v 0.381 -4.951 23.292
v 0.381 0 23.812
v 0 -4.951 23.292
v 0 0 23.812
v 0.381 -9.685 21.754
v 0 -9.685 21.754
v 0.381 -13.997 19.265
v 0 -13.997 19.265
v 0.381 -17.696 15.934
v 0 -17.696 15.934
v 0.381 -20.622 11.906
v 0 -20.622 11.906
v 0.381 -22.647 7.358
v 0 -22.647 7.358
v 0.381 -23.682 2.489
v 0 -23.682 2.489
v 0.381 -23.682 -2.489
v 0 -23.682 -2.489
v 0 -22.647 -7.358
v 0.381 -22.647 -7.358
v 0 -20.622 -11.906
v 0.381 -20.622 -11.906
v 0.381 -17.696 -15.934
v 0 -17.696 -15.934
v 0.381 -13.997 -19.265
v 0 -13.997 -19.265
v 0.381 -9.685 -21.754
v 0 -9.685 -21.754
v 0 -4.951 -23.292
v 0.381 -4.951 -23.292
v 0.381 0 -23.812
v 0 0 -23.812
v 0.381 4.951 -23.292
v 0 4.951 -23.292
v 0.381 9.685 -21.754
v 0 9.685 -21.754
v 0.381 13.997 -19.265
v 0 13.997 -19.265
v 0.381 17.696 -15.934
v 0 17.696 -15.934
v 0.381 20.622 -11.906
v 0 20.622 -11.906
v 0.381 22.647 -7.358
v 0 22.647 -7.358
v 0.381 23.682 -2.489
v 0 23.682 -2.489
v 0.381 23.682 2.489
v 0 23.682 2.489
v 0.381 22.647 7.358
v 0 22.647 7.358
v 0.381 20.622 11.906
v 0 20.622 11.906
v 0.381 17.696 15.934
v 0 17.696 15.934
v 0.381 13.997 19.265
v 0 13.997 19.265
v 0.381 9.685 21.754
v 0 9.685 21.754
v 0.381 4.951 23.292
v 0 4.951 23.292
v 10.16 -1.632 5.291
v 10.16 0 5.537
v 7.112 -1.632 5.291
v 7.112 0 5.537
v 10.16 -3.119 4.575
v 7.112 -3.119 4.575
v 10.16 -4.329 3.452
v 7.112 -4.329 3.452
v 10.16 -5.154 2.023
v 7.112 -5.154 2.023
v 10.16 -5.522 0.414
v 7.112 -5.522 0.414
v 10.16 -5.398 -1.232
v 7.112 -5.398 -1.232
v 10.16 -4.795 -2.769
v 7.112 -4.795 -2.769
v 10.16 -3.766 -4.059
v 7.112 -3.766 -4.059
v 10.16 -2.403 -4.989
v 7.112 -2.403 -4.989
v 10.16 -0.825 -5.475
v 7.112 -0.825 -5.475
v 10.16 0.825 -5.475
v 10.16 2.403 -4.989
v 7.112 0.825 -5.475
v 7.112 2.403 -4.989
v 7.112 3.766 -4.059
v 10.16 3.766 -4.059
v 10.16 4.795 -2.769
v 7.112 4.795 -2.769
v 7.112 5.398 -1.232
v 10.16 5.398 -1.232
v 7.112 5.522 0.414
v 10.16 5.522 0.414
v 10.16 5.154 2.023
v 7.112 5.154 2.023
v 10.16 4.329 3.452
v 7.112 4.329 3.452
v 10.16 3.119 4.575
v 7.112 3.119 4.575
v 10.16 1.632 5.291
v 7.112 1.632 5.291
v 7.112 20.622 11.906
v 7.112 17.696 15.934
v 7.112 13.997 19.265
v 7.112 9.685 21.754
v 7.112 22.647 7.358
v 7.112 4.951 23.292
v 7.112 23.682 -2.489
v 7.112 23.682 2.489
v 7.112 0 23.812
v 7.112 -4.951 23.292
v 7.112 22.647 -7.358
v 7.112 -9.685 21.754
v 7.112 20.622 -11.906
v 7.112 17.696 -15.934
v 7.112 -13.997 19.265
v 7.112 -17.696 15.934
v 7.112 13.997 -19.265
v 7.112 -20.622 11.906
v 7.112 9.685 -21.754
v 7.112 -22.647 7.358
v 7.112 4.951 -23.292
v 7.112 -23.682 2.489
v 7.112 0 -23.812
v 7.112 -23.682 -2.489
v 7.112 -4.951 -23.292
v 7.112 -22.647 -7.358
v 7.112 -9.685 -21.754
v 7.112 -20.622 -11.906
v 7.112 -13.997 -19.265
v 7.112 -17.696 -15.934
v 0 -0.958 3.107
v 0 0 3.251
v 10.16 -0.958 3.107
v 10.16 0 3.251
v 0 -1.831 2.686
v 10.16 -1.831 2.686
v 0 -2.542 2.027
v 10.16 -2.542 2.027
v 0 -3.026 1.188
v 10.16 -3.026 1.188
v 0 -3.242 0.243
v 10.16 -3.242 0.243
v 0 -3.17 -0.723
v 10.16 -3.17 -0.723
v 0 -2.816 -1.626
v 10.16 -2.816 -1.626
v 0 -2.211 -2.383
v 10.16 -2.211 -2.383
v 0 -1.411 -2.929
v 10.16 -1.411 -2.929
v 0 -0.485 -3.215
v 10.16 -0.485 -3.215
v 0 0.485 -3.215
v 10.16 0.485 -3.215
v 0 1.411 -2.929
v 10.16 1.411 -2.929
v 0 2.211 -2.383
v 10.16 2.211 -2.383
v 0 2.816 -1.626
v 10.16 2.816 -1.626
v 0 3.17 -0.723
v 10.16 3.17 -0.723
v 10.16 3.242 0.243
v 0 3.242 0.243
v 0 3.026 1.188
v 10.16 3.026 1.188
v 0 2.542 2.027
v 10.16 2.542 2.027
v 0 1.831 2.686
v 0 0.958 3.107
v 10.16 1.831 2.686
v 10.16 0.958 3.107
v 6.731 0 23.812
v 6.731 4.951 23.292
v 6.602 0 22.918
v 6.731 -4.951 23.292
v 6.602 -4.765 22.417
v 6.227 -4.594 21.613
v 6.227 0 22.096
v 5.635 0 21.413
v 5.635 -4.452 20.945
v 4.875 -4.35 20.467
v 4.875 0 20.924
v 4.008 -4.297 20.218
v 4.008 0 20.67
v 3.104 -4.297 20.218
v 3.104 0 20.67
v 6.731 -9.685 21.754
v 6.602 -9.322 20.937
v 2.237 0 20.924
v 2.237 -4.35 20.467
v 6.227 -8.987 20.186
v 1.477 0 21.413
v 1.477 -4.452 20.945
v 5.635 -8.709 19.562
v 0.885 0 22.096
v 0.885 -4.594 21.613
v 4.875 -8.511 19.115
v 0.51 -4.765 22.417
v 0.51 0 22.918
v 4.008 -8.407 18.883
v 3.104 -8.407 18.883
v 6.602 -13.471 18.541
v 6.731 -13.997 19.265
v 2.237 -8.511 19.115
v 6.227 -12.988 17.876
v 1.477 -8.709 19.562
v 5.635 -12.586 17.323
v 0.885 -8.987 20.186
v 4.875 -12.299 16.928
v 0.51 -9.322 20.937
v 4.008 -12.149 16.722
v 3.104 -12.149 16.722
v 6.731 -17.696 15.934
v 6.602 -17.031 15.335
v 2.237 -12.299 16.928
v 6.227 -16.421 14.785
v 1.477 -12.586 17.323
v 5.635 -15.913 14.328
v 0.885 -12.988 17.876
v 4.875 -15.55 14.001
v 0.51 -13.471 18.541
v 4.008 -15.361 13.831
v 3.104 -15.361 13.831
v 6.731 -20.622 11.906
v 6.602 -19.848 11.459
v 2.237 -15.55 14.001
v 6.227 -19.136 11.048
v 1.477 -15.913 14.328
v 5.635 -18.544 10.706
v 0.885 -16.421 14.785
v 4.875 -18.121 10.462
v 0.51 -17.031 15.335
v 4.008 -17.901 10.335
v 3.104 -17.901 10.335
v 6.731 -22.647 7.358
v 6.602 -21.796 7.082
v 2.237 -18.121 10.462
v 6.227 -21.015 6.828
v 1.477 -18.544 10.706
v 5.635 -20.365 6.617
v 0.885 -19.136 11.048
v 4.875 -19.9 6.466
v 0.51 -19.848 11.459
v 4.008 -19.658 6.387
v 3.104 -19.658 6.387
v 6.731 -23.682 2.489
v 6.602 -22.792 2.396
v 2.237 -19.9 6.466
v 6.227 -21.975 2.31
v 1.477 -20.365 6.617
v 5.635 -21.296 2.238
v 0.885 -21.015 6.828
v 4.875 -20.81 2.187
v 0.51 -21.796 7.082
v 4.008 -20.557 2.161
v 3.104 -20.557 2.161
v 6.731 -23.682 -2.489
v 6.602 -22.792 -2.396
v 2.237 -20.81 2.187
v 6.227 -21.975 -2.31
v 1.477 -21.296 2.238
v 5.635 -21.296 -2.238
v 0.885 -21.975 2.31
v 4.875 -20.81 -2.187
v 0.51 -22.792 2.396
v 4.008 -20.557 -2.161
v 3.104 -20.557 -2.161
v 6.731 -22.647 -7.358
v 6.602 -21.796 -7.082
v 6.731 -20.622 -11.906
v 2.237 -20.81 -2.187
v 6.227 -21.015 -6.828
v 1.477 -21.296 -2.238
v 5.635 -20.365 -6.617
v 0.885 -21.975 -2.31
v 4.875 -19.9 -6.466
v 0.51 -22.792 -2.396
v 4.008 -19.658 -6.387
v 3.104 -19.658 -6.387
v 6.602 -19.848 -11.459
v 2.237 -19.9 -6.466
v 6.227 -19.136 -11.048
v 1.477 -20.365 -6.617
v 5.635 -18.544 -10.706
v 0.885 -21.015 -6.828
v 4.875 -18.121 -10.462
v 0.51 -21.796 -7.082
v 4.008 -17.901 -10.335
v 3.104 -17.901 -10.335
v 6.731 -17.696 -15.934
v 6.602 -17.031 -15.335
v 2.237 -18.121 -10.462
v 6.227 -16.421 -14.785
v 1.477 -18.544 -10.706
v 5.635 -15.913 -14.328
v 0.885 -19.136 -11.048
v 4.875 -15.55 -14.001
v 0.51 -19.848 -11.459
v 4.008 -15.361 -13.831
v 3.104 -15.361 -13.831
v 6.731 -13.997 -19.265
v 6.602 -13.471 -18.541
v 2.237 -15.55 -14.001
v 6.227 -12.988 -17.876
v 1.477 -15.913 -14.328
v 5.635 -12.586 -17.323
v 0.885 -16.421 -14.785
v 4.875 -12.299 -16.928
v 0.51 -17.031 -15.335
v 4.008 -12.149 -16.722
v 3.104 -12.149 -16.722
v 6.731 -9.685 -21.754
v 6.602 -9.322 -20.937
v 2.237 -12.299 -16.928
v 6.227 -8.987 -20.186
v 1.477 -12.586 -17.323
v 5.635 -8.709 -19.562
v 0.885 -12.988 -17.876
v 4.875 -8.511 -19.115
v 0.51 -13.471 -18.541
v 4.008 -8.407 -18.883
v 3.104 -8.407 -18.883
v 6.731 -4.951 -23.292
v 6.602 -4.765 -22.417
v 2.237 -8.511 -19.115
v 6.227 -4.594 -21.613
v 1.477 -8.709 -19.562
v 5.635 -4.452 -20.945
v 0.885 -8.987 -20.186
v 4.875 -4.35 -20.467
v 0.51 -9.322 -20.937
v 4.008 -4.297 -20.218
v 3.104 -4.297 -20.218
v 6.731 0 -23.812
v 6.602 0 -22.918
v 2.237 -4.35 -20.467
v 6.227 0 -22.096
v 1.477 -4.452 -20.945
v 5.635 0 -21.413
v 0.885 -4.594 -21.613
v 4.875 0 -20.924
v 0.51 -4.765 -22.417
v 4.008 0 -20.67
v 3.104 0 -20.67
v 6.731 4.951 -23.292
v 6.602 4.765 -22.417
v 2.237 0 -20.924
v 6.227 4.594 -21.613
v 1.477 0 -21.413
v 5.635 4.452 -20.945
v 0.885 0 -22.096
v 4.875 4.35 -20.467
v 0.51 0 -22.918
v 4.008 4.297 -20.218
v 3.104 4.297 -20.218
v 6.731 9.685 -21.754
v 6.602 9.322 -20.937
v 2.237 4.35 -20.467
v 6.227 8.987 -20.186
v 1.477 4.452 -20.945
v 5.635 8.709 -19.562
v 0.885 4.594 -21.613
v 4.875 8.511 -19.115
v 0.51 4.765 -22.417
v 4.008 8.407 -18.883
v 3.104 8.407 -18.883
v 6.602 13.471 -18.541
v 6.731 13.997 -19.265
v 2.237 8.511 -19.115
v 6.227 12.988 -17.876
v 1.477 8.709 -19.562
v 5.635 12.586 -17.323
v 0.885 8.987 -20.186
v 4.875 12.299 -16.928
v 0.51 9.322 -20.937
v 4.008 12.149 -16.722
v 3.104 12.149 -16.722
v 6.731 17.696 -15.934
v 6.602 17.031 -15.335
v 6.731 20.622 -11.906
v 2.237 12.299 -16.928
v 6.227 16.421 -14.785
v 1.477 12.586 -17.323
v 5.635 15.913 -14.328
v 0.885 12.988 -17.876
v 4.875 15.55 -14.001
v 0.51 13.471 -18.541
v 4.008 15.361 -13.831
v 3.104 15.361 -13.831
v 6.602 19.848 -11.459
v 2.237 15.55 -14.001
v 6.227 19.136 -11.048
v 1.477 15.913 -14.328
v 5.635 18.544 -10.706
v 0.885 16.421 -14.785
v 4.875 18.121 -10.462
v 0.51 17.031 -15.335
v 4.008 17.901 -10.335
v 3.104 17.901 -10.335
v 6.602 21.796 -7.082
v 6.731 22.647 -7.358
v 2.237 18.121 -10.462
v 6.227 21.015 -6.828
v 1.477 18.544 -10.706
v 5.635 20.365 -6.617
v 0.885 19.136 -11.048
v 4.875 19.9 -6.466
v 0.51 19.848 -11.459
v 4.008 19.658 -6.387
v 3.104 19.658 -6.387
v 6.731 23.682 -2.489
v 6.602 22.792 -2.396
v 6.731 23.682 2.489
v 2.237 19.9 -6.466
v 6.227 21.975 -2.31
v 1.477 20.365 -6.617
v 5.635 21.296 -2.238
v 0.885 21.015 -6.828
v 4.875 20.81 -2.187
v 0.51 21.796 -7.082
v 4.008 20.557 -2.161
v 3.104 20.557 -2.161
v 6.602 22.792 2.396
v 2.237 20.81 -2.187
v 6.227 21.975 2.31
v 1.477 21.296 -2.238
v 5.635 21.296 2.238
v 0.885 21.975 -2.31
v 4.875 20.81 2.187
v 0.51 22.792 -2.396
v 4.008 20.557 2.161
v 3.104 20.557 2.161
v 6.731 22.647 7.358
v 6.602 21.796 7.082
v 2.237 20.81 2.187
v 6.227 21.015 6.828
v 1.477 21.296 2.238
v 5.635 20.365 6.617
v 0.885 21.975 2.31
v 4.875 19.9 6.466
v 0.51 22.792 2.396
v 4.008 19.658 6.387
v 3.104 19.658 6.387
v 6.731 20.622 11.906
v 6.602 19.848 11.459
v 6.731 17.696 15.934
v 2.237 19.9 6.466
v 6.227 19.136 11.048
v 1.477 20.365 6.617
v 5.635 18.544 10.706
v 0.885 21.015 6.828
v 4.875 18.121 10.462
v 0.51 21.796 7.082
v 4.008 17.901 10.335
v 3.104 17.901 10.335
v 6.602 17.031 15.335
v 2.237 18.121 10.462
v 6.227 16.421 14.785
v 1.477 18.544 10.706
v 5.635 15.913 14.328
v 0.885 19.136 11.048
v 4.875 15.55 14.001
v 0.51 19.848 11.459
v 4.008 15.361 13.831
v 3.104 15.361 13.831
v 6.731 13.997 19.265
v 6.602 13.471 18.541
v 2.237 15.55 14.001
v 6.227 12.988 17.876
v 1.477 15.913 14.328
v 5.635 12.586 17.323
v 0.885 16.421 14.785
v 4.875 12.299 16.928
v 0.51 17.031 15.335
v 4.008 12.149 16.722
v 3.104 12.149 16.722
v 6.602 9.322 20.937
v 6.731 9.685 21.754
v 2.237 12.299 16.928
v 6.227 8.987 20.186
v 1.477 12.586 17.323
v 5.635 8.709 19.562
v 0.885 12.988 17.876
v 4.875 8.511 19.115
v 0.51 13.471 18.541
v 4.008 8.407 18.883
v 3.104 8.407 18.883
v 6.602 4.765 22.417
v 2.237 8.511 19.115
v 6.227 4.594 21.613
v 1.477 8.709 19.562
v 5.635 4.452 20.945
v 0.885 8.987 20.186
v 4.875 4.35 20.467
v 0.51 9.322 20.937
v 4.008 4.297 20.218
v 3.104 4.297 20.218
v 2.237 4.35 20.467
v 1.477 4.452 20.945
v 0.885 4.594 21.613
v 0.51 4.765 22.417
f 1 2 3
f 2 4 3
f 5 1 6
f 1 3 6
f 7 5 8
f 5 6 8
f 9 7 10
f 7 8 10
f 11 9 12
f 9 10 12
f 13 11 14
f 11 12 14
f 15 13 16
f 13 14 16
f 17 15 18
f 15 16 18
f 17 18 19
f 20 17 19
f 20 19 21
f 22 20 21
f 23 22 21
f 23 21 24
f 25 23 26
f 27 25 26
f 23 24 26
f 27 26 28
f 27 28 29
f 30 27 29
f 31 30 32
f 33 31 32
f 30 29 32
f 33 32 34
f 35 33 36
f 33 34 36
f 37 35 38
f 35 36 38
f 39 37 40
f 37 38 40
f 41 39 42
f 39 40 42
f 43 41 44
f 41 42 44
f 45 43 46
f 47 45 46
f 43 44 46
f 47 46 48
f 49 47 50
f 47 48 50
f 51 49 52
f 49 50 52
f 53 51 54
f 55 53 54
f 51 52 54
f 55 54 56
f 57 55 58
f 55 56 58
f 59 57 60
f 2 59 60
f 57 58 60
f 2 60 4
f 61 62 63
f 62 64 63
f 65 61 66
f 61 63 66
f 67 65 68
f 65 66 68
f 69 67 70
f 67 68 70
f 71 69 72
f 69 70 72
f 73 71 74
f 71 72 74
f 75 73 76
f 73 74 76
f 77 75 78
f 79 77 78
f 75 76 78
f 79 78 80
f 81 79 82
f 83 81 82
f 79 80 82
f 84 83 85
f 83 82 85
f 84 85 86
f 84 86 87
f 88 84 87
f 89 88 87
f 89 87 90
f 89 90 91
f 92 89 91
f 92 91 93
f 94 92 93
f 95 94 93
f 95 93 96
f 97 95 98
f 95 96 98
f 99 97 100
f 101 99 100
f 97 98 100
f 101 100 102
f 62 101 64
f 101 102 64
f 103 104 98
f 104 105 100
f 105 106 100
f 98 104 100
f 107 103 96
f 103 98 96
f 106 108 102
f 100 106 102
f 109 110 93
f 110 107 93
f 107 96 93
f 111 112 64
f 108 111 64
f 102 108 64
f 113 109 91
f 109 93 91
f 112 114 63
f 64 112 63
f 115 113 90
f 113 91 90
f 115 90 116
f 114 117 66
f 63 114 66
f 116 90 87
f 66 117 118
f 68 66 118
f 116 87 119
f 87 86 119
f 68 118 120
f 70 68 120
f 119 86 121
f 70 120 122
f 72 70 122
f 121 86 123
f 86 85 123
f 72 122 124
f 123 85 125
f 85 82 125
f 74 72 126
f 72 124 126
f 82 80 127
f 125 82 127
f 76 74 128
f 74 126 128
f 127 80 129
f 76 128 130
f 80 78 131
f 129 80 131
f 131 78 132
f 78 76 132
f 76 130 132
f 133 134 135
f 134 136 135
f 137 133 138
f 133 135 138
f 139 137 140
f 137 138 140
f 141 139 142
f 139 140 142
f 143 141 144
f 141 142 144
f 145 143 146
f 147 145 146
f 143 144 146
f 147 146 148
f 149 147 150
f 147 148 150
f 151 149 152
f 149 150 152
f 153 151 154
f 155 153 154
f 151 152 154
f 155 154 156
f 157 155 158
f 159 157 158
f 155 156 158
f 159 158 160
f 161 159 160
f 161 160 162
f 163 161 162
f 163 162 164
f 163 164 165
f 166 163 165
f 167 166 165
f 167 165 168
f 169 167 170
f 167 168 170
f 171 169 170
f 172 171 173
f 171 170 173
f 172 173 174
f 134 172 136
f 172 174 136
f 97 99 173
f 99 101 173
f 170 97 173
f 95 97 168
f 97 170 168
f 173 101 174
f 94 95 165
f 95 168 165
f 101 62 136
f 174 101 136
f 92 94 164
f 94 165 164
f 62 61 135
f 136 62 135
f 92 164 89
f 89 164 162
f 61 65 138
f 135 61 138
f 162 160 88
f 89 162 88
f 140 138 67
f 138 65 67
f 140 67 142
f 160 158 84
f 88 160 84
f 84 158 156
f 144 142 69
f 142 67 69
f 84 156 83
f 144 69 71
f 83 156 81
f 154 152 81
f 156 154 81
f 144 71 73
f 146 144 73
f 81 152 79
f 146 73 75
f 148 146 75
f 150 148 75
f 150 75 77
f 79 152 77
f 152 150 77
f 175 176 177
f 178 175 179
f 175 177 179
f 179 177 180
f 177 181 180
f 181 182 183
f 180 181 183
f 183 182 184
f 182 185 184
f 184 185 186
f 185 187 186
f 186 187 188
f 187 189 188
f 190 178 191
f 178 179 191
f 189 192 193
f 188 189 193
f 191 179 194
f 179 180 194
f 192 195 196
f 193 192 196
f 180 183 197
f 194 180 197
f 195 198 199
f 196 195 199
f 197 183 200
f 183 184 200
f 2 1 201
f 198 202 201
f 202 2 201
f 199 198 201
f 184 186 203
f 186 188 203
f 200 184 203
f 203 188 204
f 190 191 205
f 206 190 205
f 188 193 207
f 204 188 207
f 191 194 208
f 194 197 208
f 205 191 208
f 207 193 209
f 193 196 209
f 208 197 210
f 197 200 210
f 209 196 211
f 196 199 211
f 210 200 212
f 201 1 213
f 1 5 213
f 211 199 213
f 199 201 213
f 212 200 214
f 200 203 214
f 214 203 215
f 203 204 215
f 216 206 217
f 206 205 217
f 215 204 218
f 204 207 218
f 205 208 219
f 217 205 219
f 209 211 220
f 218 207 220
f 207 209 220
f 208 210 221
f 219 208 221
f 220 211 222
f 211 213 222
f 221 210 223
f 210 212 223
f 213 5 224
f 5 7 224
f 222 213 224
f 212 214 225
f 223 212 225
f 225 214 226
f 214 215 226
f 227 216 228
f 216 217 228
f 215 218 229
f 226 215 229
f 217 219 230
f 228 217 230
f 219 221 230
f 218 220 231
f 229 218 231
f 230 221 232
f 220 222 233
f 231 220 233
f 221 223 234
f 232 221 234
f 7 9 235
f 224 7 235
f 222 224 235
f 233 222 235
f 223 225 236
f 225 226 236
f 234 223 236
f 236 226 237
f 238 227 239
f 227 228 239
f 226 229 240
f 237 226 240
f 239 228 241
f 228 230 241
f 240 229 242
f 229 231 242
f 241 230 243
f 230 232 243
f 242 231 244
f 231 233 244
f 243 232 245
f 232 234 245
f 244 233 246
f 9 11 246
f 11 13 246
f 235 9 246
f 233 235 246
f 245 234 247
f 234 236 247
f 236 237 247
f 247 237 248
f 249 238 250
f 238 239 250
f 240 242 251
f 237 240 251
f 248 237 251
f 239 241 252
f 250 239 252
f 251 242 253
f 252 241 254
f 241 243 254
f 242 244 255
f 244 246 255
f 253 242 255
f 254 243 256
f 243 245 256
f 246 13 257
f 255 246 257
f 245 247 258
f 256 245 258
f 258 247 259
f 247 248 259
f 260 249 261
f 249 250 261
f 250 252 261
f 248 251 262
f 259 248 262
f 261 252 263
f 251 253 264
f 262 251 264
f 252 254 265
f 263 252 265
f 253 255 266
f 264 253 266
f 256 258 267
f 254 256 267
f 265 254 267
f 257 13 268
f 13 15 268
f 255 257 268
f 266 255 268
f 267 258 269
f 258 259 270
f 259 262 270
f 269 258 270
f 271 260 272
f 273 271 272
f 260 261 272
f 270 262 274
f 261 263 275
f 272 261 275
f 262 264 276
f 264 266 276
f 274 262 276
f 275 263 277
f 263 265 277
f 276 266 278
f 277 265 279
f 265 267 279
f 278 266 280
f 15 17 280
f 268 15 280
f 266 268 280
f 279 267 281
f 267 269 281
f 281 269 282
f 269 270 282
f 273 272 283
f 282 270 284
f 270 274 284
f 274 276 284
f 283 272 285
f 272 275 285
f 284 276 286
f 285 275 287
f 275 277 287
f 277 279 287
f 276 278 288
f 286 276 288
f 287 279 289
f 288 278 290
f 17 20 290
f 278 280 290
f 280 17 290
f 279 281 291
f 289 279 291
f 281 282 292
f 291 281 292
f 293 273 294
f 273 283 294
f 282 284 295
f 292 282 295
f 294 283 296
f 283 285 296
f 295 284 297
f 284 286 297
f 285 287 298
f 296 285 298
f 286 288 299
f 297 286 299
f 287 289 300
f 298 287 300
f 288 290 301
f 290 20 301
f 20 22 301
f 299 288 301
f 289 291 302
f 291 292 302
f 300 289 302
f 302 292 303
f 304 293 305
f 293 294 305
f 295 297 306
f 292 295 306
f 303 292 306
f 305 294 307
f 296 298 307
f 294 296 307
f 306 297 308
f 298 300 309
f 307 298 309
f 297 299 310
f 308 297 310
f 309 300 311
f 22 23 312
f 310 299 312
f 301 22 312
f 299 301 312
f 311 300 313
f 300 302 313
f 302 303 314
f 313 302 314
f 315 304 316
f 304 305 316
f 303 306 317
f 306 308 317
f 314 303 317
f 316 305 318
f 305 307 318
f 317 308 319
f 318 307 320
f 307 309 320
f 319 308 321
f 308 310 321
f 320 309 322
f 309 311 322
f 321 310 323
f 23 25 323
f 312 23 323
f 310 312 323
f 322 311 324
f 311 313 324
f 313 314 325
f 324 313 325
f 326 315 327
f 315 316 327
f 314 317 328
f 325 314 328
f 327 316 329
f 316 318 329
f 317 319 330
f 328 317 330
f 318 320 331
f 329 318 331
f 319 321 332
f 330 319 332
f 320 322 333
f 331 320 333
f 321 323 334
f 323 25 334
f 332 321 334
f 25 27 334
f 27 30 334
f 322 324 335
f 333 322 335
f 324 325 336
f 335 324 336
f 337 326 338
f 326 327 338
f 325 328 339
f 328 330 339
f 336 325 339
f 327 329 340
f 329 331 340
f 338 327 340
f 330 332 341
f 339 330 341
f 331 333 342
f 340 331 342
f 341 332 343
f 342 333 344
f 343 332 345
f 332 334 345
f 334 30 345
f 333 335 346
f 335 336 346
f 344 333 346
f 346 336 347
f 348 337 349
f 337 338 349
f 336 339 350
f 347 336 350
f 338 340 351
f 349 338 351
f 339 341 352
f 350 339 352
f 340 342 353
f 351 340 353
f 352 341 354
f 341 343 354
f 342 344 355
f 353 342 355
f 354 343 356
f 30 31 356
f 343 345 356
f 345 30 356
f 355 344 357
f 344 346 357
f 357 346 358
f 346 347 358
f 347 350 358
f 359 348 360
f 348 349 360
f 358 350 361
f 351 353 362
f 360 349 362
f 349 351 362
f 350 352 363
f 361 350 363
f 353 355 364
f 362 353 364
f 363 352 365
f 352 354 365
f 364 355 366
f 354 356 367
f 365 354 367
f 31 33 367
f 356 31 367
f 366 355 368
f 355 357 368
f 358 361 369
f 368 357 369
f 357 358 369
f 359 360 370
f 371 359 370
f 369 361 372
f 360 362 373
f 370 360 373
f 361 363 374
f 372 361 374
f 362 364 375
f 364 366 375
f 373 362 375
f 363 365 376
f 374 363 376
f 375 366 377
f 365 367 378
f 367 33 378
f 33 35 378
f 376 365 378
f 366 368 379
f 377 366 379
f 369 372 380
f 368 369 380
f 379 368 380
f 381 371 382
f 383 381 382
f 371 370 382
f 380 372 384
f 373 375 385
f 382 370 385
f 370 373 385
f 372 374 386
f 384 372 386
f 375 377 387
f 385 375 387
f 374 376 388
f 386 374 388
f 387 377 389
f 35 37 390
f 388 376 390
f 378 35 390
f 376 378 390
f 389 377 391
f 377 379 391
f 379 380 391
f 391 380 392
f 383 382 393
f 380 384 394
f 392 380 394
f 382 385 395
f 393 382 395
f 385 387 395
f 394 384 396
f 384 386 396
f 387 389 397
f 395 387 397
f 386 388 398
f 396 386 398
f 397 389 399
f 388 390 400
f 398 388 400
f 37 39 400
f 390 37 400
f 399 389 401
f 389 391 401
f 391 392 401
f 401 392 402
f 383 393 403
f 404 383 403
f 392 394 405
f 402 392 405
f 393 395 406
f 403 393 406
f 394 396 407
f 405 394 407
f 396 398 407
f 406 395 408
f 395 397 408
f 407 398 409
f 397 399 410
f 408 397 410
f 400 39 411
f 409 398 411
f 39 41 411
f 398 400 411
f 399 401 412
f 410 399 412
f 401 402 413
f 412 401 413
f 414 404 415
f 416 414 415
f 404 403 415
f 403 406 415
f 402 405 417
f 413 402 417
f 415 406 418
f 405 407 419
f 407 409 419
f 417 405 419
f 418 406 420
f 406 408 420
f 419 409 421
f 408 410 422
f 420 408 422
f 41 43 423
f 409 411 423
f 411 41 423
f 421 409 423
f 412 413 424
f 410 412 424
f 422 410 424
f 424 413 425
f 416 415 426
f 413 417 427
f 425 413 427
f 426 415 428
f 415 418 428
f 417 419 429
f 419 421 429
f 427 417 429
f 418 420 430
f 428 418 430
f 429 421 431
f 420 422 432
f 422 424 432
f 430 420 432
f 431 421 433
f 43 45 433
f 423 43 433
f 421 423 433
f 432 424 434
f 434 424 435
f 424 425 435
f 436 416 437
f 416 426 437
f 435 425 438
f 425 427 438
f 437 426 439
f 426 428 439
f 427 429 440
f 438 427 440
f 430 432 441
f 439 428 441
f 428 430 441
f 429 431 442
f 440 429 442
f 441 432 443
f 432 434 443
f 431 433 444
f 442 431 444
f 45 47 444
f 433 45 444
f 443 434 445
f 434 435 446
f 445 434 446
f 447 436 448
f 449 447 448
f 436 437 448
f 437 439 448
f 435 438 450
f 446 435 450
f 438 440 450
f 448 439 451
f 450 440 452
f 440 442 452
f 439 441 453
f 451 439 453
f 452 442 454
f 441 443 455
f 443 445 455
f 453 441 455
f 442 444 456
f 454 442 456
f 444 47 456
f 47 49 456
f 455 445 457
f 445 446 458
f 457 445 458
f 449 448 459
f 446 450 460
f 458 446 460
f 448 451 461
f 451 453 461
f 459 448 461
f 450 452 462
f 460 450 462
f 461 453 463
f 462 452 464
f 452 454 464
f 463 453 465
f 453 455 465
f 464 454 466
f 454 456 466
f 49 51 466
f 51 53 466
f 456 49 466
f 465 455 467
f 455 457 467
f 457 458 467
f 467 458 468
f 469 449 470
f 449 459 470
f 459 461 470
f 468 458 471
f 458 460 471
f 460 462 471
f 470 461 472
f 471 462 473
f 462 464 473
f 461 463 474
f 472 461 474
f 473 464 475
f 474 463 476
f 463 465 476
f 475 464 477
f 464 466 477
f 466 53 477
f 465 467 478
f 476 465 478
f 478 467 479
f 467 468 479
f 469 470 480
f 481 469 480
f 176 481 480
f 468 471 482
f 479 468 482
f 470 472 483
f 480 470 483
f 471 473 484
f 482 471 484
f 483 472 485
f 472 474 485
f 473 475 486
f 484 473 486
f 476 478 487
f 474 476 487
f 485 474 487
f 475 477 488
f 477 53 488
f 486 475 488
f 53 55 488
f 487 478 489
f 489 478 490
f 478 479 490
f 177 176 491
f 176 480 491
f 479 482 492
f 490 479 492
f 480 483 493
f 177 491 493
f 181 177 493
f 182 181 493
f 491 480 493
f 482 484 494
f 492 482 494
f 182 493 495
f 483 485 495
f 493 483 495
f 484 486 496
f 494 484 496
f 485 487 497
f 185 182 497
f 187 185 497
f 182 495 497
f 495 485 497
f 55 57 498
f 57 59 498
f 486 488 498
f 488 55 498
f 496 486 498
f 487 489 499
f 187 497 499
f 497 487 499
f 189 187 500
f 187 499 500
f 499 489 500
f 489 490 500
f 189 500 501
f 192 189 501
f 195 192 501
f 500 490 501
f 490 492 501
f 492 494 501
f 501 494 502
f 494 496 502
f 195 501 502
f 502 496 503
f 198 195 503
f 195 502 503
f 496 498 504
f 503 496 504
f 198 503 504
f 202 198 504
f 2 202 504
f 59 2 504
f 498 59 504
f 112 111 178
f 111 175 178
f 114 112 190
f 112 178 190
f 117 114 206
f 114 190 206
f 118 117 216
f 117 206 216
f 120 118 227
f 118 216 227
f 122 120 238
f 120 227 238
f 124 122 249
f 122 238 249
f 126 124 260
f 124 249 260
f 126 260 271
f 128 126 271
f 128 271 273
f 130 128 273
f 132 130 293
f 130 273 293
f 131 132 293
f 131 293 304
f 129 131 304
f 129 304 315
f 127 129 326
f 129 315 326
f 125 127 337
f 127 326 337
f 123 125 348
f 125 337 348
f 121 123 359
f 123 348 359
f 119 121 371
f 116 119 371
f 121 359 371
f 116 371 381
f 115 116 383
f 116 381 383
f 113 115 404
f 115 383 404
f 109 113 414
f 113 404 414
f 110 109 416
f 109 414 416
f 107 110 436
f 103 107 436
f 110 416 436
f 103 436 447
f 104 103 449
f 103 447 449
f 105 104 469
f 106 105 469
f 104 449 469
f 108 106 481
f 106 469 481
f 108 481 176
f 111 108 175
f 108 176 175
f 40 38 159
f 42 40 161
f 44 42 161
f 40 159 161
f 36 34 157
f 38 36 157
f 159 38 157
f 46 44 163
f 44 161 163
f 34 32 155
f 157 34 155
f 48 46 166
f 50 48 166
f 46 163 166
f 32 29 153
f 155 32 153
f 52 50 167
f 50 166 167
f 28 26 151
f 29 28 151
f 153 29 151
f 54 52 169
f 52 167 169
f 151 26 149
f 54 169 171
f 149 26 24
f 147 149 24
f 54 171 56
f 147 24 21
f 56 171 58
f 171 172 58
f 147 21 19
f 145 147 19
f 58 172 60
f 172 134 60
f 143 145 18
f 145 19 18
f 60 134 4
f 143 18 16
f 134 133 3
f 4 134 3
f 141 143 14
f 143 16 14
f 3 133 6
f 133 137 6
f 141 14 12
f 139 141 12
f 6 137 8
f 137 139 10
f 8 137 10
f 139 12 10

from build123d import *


with BuildPart() as f1:
    # F0 (on Front) → F1 (revolve)
    with BuildSketch(Plane.XZ):
        with BuildLine():
            Line((0, 23.8125), (0, 3.2512))
            Line((0, 3.2512), (10.16, 3.2512))
            Line((10.16, 3.2512), (10.16, 5.5372))
            Line((10.16, 5.5372), (7.112, 5.5372))
            Line((7.112, 5.5372), (7.112, 23.8125))
            Line((7.112, 23.8125), (6.731, 23.8125))
            ThreePointArc((6.731, 23.8125), (3.556, 20.6375), (0.381, 23.8125))
            Line((0.381, 23.8125), (0, 23.8125))
        make_face()
    revolve(axis=Axis((6.071118, 0, 0), (1, 0, 0)))


solid = f1.part
